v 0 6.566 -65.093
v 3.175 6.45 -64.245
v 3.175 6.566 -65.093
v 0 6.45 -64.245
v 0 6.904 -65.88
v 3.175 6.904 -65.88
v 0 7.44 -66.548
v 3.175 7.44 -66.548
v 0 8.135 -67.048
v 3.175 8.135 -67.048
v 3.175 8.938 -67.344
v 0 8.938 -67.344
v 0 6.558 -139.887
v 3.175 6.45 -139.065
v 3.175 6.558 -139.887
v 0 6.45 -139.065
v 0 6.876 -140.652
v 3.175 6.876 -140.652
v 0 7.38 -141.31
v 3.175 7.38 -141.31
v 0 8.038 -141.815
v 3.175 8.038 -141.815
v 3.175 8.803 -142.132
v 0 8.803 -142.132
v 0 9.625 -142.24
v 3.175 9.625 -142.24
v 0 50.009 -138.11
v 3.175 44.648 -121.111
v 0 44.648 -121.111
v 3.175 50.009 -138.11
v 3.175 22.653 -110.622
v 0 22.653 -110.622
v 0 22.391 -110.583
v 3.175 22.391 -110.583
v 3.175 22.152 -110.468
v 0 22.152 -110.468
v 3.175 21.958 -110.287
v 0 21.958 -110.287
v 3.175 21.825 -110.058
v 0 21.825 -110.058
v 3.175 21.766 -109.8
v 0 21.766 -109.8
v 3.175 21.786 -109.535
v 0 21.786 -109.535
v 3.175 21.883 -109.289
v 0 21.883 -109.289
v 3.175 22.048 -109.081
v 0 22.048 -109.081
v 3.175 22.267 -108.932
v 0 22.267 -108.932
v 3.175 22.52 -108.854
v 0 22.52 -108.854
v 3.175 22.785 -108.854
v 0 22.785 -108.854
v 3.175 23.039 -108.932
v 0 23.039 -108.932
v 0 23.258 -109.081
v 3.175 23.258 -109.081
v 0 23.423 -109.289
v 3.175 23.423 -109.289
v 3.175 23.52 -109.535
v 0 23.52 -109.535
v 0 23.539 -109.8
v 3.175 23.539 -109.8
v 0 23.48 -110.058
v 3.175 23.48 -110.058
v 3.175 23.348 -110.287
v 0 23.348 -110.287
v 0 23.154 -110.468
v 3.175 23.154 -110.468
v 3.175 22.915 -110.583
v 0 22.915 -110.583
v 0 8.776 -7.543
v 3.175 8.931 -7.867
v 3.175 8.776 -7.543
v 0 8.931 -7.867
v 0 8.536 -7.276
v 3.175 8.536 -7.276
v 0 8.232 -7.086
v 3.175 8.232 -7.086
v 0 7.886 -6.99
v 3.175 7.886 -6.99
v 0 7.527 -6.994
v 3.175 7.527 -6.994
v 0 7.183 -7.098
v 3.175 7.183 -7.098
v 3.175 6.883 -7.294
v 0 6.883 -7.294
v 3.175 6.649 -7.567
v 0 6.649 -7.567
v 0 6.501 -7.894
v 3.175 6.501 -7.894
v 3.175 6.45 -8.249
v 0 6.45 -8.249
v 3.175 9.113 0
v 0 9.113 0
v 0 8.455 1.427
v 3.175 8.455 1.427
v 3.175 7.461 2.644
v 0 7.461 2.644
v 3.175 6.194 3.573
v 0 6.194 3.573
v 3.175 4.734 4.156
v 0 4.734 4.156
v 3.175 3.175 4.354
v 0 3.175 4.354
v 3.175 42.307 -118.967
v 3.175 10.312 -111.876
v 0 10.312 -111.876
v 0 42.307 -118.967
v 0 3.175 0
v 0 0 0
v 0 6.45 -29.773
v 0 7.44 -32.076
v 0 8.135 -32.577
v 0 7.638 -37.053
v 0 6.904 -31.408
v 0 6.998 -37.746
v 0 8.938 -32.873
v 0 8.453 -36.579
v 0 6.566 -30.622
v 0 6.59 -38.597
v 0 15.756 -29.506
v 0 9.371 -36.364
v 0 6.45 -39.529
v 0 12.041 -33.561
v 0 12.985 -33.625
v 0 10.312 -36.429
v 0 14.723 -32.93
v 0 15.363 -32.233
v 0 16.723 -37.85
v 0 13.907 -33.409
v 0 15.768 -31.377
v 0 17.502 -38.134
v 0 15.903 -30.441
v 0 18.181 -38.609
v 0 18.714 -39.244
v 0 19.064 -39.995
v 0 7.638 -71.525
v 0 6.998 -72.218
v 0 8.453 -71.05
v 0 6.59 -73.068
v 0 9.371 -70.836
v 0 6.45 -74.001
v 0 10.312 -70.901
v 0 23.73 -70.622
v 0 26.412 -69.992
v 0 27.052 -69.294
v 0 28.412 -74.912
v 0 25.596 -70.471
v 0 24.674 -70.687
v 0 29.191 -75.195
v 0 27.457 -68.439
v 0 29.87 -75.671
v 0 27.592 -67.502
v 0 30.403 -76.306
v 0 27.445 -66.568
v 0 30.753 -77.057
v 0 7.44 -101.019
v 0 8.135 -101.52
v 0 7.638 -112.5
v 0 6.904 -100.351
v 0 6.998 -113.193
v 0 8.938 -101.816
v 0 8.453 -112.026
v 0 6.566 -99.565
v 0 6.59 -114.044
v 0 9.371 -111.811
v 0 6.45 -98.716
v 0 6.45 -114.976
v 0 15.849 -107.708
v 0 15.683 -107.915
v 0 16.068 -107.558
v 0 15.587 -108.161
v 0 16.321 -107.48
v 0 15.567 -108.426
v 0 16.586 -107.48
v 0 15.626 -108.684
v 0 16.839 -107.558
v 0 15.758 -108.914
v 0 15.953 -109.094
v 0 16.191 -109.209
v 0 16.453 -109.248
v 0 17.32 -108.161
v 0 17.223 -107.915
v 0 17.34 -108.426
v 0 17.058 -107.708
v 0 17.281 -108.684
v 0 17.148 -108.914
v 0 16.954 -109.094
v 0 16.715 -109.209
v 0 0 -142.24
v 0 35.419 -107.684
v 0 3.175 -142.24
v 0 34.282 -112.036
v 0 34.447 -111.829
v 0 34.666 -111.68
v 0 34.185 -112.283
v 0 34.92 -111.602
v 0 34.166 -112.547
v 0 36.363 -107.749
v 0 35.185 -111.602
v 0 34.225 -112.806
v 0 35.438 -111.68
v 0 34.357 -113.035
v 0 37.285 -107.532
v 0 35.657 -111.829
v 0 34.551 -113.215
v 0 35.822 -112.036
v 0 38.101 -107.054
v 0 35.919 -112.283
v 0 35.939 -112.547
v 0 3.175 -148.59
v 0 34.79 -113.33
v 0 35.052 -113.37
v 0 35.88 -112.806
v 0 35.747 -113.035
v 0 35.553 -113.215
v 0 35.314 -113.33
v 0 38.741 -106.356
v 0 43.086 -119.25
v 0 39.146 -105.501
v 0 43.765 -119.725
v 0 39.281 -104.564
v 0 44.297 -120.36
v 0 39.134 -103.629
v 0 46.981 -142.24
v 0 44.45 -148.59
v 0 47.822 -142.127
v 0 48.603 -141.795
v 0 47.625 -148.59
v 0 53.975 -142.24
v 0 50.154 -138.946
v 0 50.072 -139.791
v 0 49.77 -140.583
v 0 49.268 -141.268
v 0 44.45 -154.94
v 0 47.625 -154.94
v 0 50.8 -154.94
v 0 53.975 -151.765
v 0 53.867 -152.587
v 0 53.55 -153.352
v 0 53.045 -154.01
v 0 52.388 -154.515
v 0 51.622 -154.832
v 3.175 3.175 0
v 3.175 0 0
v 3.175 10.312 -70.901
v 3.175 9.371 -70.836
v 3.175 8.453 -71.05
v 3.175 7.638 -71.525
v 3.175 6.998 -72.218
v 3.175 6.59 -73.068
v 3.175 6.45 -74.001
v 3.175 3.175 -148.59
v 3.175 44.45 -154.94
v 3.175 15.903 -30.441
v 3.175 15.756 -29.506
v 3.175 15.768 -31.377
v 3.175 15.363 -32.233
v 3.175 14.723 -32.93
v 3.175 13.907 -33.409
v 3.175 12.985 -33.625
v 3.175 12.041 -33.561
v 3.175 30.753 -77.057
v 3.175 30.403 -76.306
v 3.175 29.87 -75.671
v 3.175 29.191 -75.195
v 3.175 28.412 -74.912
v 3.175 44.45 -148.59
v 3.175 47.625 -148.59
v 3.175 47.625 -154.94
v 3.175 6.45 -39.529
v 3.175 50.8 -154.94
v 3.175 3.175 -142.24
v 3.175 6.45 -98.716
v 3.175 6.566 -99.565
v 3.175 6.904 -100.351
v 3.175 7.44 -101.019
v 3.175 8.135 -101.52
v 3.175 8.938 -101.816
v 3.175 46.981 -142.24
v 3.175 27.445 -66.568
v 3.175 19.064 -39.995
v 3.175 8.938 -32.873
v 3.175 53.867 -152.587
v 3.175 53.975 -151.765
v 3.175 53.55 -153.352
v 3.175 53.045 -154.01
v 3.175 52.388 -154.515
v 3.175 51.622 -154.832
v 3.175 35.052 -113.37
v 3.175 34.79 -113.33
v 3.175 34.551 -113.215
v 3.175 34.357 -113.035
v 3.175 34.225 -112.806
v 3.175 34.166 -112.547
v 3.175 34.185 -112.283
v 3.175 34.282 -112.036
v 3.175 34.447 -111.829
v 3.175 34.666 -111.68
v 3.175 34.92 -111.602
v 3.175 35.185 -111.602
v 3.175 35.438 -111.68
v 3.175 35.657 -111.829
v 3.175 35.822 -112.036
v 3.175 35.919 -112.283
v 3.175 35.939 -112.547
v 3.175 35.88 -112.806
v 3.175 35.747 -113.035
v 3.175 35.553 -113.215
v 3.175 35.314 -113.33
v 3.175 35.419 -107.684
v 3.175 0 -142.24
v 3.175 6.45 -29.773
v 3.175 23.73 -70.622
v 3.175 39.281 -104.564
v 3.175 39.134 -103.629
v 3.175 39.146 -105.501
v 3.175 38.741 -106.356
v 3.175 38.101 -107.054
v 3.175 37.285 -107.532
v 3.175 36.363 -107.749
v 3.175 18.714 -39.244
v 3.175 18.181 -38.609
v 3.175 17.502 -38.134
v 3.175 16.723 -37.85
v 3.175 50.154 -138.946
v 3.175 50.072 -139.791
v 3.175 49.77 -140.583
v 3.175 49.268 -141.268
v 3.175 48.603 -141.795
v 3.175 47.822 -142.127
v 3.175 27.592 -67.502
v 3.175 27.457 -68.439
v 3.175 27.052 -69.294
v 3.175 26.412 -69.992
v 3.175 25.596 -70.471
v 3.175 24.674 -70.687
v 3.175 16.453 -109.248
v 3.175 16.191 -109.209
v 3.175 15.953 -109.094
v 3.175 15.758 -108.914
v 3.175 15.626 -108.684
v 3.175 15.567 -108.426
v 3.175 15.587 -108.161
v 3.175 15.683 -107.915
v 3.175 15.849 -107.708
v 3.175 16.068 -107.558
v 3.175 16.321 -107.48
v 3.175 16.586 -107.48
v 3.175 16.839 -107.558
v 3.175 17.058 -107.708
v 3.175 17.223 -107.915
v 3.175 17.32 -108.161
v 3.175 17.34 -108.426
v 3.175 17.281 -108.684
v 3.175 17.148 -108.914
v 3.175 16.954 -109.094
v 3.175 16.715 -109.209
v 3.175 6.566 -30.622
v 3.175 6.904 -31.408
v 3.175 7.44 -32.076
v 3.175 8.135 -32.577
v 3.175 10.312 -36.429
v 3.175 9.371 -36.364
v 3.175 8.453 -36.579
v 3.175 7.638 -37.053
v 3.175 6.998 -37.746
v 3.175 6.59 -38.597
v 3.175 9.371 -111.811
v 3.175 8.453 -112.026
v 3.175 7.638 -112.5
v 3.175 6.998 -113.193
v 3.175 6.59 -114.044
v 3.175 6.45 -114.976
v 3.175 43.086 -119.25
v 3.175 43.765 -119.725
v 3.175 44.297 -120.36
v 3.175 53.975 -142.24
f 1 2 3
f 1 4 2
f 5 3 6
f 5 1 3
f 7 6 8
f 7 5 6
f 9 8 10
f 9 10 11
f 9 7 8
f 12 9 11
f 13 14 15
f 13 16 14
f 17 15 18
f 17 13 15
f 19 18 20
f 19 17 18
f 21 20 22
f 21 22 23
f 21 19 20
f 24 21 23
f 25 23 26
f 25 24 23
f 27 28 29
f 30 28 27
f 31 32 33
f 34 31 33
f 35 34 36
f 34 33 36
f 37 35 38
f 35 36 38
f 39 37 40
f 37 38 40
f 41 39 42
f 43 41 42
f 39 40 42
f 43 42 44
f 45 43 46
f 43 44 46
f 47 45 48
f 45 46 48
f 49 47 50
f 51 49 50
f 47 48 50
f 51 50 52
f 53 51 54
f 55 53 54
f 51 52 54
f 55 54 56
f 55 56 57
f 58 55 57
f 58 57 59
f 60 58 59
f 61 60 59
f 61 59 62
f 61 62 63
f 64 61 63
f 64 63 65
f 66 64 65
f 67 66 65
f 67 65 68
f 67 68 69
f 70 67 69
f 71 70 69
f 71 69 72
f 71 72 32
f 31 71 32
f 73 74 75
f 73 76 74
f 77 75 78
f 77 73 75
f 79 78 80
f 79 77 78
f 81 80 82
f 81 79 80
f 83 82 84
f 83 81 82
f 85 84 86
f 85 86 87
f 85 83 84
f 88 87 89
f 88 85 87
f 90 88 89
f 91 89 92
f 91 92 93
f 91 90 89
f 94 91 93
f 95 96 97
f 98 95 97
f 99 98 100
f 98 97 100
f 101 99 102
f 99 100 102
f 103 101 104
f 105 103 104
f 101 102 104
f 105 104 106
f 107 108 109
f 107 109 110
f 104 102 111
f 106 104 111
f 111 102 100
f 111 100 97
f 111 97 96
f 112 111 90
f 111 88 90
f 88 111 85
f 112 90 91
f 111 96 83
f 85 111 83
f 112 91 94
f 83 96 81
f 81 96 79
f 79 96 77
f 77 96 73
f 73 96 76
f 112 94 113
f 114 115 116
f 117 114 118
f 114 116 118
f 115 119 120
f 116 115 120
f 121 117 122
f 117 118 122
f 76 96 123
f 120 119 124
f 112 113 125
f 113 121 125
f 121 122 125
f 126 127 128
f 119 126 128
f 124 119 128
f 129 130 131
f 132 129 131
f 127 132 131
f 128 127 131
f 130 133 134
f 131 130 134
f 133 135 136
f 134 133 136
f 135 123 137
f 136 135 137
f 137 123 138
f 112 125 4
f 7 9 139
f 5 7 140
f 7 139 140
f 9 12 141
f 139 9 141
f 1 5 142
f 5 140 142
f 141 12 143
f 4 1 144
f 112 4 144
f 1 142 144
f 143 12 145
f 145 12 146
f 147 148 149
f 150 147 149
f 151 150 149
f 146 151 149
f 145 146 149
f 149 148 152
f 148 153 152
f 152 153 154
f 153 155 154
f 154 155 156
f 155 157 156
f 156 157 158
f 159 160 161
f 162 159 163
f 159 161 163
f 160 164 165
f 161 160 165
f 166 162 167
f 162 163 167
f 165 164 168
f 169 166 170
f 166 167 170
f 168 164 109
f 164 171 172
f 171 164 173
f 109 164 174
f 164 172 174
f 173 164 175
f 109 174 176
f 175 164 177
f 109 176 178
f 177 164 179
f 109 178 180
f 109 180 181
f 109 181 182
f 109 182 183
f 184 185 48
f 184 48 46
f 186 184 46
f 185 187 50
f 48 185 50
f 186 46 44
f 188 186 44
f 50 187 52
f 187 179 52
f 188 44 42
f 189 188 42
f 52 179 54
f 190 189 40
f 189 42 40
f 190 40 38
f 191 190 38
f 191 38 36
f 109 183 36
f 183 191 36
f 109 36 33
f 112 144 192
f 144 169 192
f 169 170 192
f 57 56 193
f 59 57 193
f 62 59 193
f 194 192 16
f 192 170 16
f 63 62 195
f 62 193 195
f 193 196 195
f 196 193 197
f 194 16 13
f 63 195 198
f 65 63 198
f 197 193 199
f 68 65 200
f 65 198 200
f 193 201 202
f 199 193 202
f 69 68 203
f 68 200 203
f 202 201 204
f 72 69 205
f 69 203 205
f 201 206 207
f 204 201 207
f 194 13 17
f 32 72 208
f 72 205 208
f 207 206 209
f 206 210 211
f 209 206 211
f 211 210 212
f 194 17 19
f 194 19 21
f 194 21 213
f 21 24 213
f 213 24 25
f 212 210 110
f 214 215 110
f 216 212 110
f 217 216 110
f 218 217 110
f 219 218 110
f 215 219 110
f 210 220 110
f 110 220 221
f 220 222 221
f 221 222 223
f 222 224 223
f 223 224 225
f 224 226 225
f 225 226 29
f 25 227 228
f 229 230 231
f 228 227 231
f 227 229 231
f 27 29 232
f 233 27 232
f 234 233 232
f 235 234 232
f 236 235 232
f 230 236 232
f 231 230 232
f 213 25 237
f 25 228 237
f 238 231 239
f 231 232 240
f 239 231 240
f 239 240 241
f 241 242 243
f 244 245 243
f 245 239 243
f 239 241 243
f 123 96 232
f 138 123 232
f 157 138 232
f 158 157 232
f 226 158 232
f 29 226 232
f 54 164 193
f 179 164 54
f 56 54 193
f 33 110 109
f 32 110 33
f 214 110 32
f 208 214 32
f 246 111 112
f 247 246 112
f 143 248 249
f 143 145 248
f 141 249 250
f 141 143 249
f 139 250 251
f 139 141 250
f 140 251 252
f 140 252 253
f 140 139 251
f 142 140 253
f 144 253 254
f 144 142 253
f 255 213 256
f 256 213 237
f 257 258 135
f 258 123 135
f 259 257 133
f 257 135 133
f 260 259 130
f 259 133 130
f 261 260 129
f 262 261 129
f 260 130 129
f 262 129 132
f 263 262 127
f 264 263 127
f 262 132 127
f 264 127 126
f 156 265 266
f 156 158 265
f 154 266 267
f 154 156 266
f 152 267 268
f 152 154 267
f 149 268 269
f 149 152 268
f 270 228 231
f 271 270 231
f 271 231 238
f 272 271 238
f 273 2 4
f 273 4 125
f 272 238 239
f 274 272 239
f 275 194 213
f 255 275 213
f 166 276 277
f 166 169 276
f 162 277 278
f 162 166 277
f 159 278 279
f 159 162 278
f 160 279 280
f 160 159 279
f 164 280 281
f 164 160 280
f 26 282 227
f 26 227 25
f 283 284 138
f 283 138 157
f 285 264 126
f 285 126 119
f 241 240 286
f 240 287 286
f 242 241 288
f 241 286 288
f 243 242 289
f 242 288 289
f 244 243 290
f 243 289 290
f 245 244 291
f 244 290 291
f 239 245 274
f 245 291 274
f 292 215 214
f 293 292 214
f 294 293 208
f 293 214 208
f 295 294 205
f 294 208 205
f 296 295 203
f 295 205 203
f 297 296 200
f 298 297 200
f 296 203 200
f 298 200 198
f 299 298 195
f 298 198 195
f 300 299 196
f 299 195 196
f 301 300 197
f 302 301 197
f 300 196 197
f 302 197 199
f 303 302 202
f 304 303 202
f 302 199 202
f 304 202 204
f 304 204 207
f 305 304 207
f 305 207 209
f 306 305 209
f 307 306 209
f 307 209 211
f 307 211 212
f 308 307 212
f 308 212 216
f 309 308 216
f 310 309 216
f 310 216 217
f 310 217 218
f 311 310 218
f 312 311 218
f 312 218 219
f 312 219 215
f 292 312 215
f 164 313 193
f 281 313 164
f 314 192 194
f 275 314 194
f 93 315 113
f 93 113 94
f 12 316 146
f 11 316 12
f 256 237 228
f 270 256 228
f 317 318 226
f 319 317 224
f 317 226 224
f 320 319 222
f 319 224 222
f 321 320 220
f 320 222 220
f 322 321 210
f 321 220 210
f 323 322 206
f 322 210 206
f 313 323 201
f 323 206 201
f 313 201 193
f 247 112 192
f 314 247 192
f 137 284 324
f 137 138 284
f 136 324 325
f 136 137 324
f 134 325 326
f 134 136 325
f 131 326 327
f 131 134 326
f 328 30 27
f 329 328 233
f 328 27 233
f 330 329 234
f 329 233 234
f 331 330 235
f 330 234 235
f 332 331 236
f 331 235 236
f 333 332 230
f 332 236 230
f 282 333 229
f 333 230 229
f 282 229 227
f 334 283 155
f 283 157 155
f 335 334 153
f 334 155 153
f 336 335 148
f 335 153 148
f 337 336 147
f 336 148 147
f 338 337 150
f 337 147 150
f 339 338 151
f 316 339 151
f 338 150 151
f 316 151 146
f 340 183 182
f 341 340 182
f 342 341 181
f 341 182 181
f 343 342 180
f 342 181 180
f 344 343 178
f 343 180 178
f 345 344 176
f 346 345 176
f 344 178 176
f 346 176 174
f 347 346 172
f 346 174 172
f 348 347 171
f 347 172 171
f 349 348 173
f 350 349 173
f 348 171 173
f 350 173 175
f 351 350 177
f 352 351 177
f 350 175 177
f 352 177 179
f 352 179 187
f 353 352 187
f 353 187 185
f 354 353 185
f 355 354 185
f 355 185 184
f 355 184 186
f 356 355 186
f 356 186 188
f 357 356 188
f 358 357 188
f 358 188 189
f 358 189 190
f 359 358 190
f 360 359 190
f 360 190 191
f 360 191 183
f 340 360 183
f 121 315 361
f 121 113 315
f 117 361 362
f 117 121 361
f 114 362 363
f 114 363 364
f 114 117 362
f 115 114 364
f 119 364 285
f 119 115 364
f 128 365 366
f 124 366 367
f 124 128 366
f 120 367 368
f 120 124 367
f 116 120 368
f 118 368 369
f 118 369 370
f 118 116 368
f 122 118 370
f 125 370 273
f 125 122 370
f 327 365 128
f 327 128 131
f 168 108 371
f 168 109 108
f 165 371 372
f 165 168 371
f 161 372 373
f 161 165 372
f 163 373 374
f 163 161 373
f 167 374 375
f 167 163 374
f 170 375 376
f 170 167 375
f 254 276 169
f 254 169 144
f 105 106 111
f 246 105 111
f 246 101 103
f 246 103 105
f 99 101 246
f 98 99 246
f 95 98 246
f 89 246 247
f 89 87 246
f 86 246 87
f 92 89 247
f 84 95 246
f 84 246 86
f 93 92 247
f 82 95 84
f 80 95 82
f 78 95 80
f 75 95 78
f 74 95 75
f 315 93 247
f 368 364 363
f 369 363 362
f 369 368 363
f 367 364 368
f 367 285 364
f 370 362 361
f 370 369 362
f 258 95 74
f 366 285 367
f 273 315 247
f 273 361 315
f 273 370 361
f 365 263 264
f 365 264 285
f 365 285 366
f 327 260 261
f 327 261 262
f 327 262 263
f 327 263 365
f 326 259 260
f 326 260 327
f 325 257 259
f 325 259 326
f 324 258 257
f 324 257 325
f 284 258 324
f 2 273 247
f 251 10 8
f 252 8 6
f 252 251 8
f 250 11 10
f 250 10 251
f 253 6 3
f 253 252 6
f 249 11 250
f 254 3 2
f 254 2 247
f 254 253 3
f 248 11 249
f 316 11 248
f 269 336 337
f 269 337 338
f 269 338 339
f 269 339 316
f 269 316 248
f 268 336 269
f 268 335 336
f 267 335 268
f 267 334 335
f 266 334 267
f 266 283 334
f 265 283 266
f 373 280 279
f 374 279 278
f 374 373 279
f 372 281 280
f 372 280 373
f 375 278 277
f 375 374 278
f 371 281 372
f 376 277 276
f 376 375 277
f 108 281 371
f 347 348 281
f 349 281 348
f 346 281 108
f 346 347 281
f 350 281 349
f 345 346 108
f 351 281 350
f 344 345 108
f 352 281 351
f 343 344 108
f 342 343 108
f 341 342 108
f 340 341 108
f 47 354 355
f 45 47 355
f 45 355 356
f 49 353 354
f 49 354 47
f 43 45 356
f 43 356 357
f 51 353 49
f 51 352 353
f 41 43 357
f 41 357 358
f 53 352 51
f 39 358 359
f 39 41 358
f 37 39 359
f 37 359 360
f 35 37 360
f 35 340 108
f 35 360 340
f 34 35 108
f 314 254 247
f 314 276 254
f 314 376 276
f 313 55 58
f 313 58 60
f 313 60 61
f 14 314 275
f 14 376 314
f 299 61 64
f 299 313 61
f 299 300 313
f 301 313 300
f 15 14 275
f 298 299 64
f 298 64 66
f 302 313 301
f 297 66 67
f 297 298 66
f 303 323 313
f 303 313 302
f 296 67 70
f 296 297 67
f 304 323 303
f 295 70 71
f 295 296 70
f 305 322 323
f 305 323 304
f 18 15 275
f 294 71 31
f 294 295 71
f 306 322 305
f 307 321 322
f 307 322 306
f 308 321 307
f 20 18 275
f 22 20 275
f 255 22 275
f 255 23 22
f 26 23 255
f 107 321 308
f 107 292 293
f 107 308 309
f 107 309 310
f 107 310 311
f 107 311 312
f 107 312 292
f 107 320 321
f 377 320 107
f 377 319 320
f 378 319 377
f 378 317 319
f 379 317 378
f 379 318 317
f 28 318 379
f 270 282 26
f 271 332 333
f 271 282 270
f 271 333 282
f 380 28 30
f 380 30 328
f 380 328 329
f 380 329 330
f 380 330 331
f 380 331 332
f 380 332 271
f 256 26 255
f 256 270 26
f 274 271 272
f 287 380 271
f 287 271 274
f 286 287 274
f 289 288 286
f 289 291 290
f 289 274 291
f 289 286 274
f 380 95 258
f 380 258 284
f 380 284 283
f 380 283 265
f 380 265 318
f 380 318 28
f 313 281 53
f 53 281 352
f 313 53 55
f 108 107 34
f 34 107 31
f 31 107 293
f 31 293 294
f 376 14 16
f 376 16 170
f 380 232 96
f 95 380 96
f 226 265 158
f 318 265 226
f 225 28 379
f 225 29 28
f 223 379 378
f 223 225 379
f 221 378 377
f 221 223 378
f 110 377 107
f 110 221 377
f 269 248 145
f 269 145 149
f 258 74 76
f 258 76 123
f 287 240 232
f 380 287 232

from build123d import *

# Parameters (mm, degrees)
BOSS_EXTRUDE1_DEPTH             = 3.175
CUT_EXTRUDE1_DEPTH              = 165.102970266
FILLET4_R                       = 3.175
FILLET5_R                       = 3.175
FILLET6_R                       = 3.175
FILLET7_R                       = 1.27
F_2_56_TAPPED_HOLE1_D           = 1.778
F_2_56_TAPPED_HOLE1_ON_FACE_2_D = 1.778


with BuildPart() as part:
    # Sketch1 → Boss-Extrude1 (new body)
    with BuildSketch(Plane(origin=(0, 0, 0), x_dir=(0, 0, -1), z_dir=(1, 0, 0))):
        with BuildLine():
            Line((0, 0), (142.24, 0))
            Line((142.24, 0), (142.24, 3.175))
            Line((142.24, 3.175), (148.59, 3.175))
            Line((148.59, 3.175), (154.94, 44.45))
            Line((154.94, 44.45), (148.59, 44.45))
            Line((148.59, 44.45), (148.59, 47.625))
            Line((148.59, 47.625), (154.94, 47.625))
            Line((154.94, 47.625), (154.94, 53.975))
            Line((154.94, 53.975), (142.24, 53.975))
            Line((142.24, 53.975), (0, 9.113473275))
            ThreePointArc((0, 9.113473275), (-3.148798139, 6.856769541), (-4.353876774, 3.175))
            Line((-4.353876774, 3.175), (0, 3.175))
            Line((0, 3.175), (0, 0))
        make_face()
    extrude(amount=BOSS_EXTRUDE1_DEPTH)

    # Sketch2 → Cut-Extrude1 (cut, through all)
    with BuildSketch(Plane(origin=(3.175, 0, 0), x_dir=(0, 0, -1), z_dir=(1, 0, 0))):
        Polygon((142.24, 6.450137188), (142.24, 51.311663913), (119.363152794, 44.096462195), (111.020554533, 6.450137188), align=None)
        Polygon((101.264477824, 6.450137188), (108.873959331, 40.788242054), (75.30854025, 30.201937603), (70.045032356, 6.450137188), align=None)
        Polygon((66.793006787, 6.450137188), (71.812142429, 29.099197556), (38.246723348, 18.512893105), (35.573561319, 6.450137188), align=None)
        Polygon((34.750325527, 17.410153058), (0, 6.450137188), (32.32153575, 6.450137188), align=None)
    extrude(amount=-CUT_EXTRUDE1_DEPTH, mode=Mode.SUBTRACT)

    # Fillet4
    fillet4_edges = [part.edges().sort_by_distance(p)[0] for p in [
        (1.5875, 6.450137188, -32.32153575),
        (1.5875, 6.450137188, -35.573561319),
        (1.5875, 6.450137188, -66.793006787),
        (1.5875, 6.450137188, -70.045032356),
        (1.5875, 6.450137188, -101.264477824),
        (1.5875, 6.450137188, -111.020554533),
        (1.5875, 6.450137188, -142.24),
        (1.5875, 18.512893105, -38.246723348),
        (1.5875, 30.201937603, -75.30854025),
        (1.5875, 44.096462195, -119.363152794),
    ]]
    fillet(fillet4_edges, radius=FILLET4_R)

    # Fillet5
    fillet5_edges = [part.edges().sort_by_distance(p)[0] for p in [
        (1.5875, 17.410153058, -34.750325527),
        (1.5875, 29.099197556, -71.812142429),
        (1.5875, 40.788242054, -108.873959331),
        (1.5875, 51.311663913, -142.24),
    ]]
    fillet(fillet5_edges, radius=FILLET5_R)

    # Fillet6
    fillet6_edges = [part.edges().sort_by_distance(p)[0] for p in [
        (1.5875, 53.975, -154.94),
    ]]
    fillet(fillet6_edges, radius=FILLET6_R)

    # Fillet7
    fillet7_edges = [part.edges().sort_by_distance(p)[0] for p in [
        (1.5875, 6.450137188, 0),
    ]]
    fillet(fillet7_edges, radius=FILLET7_R)

    # #2-56 Tapped Hole1 (through all)
    with Locations(Plane(origin=(3.175, 35.052107057, -112.480843865), x_dir=(0, 0, 1), z_dir=(1, 0, 0))):
        with Locations((0, 0), (2.747718528, 12.399195251), (4.121577793, 18.598792877)):
            Hole(F_2_56_TAPPED_HOLE1_D / 2)

    # #2-56 Tapped Hole1 on face 2 (through all)
    with Locations(Plane(origin=(524.251745337, 38.733811309, 0), x_dir=(0, 0, 1), z_dir=(1, 0, 0))):
        with Locations((0, 0)):
            Hole(F_2_56_TAPPED_HOLE1_ON_FACE_2_D / 2)


solid = part.part
